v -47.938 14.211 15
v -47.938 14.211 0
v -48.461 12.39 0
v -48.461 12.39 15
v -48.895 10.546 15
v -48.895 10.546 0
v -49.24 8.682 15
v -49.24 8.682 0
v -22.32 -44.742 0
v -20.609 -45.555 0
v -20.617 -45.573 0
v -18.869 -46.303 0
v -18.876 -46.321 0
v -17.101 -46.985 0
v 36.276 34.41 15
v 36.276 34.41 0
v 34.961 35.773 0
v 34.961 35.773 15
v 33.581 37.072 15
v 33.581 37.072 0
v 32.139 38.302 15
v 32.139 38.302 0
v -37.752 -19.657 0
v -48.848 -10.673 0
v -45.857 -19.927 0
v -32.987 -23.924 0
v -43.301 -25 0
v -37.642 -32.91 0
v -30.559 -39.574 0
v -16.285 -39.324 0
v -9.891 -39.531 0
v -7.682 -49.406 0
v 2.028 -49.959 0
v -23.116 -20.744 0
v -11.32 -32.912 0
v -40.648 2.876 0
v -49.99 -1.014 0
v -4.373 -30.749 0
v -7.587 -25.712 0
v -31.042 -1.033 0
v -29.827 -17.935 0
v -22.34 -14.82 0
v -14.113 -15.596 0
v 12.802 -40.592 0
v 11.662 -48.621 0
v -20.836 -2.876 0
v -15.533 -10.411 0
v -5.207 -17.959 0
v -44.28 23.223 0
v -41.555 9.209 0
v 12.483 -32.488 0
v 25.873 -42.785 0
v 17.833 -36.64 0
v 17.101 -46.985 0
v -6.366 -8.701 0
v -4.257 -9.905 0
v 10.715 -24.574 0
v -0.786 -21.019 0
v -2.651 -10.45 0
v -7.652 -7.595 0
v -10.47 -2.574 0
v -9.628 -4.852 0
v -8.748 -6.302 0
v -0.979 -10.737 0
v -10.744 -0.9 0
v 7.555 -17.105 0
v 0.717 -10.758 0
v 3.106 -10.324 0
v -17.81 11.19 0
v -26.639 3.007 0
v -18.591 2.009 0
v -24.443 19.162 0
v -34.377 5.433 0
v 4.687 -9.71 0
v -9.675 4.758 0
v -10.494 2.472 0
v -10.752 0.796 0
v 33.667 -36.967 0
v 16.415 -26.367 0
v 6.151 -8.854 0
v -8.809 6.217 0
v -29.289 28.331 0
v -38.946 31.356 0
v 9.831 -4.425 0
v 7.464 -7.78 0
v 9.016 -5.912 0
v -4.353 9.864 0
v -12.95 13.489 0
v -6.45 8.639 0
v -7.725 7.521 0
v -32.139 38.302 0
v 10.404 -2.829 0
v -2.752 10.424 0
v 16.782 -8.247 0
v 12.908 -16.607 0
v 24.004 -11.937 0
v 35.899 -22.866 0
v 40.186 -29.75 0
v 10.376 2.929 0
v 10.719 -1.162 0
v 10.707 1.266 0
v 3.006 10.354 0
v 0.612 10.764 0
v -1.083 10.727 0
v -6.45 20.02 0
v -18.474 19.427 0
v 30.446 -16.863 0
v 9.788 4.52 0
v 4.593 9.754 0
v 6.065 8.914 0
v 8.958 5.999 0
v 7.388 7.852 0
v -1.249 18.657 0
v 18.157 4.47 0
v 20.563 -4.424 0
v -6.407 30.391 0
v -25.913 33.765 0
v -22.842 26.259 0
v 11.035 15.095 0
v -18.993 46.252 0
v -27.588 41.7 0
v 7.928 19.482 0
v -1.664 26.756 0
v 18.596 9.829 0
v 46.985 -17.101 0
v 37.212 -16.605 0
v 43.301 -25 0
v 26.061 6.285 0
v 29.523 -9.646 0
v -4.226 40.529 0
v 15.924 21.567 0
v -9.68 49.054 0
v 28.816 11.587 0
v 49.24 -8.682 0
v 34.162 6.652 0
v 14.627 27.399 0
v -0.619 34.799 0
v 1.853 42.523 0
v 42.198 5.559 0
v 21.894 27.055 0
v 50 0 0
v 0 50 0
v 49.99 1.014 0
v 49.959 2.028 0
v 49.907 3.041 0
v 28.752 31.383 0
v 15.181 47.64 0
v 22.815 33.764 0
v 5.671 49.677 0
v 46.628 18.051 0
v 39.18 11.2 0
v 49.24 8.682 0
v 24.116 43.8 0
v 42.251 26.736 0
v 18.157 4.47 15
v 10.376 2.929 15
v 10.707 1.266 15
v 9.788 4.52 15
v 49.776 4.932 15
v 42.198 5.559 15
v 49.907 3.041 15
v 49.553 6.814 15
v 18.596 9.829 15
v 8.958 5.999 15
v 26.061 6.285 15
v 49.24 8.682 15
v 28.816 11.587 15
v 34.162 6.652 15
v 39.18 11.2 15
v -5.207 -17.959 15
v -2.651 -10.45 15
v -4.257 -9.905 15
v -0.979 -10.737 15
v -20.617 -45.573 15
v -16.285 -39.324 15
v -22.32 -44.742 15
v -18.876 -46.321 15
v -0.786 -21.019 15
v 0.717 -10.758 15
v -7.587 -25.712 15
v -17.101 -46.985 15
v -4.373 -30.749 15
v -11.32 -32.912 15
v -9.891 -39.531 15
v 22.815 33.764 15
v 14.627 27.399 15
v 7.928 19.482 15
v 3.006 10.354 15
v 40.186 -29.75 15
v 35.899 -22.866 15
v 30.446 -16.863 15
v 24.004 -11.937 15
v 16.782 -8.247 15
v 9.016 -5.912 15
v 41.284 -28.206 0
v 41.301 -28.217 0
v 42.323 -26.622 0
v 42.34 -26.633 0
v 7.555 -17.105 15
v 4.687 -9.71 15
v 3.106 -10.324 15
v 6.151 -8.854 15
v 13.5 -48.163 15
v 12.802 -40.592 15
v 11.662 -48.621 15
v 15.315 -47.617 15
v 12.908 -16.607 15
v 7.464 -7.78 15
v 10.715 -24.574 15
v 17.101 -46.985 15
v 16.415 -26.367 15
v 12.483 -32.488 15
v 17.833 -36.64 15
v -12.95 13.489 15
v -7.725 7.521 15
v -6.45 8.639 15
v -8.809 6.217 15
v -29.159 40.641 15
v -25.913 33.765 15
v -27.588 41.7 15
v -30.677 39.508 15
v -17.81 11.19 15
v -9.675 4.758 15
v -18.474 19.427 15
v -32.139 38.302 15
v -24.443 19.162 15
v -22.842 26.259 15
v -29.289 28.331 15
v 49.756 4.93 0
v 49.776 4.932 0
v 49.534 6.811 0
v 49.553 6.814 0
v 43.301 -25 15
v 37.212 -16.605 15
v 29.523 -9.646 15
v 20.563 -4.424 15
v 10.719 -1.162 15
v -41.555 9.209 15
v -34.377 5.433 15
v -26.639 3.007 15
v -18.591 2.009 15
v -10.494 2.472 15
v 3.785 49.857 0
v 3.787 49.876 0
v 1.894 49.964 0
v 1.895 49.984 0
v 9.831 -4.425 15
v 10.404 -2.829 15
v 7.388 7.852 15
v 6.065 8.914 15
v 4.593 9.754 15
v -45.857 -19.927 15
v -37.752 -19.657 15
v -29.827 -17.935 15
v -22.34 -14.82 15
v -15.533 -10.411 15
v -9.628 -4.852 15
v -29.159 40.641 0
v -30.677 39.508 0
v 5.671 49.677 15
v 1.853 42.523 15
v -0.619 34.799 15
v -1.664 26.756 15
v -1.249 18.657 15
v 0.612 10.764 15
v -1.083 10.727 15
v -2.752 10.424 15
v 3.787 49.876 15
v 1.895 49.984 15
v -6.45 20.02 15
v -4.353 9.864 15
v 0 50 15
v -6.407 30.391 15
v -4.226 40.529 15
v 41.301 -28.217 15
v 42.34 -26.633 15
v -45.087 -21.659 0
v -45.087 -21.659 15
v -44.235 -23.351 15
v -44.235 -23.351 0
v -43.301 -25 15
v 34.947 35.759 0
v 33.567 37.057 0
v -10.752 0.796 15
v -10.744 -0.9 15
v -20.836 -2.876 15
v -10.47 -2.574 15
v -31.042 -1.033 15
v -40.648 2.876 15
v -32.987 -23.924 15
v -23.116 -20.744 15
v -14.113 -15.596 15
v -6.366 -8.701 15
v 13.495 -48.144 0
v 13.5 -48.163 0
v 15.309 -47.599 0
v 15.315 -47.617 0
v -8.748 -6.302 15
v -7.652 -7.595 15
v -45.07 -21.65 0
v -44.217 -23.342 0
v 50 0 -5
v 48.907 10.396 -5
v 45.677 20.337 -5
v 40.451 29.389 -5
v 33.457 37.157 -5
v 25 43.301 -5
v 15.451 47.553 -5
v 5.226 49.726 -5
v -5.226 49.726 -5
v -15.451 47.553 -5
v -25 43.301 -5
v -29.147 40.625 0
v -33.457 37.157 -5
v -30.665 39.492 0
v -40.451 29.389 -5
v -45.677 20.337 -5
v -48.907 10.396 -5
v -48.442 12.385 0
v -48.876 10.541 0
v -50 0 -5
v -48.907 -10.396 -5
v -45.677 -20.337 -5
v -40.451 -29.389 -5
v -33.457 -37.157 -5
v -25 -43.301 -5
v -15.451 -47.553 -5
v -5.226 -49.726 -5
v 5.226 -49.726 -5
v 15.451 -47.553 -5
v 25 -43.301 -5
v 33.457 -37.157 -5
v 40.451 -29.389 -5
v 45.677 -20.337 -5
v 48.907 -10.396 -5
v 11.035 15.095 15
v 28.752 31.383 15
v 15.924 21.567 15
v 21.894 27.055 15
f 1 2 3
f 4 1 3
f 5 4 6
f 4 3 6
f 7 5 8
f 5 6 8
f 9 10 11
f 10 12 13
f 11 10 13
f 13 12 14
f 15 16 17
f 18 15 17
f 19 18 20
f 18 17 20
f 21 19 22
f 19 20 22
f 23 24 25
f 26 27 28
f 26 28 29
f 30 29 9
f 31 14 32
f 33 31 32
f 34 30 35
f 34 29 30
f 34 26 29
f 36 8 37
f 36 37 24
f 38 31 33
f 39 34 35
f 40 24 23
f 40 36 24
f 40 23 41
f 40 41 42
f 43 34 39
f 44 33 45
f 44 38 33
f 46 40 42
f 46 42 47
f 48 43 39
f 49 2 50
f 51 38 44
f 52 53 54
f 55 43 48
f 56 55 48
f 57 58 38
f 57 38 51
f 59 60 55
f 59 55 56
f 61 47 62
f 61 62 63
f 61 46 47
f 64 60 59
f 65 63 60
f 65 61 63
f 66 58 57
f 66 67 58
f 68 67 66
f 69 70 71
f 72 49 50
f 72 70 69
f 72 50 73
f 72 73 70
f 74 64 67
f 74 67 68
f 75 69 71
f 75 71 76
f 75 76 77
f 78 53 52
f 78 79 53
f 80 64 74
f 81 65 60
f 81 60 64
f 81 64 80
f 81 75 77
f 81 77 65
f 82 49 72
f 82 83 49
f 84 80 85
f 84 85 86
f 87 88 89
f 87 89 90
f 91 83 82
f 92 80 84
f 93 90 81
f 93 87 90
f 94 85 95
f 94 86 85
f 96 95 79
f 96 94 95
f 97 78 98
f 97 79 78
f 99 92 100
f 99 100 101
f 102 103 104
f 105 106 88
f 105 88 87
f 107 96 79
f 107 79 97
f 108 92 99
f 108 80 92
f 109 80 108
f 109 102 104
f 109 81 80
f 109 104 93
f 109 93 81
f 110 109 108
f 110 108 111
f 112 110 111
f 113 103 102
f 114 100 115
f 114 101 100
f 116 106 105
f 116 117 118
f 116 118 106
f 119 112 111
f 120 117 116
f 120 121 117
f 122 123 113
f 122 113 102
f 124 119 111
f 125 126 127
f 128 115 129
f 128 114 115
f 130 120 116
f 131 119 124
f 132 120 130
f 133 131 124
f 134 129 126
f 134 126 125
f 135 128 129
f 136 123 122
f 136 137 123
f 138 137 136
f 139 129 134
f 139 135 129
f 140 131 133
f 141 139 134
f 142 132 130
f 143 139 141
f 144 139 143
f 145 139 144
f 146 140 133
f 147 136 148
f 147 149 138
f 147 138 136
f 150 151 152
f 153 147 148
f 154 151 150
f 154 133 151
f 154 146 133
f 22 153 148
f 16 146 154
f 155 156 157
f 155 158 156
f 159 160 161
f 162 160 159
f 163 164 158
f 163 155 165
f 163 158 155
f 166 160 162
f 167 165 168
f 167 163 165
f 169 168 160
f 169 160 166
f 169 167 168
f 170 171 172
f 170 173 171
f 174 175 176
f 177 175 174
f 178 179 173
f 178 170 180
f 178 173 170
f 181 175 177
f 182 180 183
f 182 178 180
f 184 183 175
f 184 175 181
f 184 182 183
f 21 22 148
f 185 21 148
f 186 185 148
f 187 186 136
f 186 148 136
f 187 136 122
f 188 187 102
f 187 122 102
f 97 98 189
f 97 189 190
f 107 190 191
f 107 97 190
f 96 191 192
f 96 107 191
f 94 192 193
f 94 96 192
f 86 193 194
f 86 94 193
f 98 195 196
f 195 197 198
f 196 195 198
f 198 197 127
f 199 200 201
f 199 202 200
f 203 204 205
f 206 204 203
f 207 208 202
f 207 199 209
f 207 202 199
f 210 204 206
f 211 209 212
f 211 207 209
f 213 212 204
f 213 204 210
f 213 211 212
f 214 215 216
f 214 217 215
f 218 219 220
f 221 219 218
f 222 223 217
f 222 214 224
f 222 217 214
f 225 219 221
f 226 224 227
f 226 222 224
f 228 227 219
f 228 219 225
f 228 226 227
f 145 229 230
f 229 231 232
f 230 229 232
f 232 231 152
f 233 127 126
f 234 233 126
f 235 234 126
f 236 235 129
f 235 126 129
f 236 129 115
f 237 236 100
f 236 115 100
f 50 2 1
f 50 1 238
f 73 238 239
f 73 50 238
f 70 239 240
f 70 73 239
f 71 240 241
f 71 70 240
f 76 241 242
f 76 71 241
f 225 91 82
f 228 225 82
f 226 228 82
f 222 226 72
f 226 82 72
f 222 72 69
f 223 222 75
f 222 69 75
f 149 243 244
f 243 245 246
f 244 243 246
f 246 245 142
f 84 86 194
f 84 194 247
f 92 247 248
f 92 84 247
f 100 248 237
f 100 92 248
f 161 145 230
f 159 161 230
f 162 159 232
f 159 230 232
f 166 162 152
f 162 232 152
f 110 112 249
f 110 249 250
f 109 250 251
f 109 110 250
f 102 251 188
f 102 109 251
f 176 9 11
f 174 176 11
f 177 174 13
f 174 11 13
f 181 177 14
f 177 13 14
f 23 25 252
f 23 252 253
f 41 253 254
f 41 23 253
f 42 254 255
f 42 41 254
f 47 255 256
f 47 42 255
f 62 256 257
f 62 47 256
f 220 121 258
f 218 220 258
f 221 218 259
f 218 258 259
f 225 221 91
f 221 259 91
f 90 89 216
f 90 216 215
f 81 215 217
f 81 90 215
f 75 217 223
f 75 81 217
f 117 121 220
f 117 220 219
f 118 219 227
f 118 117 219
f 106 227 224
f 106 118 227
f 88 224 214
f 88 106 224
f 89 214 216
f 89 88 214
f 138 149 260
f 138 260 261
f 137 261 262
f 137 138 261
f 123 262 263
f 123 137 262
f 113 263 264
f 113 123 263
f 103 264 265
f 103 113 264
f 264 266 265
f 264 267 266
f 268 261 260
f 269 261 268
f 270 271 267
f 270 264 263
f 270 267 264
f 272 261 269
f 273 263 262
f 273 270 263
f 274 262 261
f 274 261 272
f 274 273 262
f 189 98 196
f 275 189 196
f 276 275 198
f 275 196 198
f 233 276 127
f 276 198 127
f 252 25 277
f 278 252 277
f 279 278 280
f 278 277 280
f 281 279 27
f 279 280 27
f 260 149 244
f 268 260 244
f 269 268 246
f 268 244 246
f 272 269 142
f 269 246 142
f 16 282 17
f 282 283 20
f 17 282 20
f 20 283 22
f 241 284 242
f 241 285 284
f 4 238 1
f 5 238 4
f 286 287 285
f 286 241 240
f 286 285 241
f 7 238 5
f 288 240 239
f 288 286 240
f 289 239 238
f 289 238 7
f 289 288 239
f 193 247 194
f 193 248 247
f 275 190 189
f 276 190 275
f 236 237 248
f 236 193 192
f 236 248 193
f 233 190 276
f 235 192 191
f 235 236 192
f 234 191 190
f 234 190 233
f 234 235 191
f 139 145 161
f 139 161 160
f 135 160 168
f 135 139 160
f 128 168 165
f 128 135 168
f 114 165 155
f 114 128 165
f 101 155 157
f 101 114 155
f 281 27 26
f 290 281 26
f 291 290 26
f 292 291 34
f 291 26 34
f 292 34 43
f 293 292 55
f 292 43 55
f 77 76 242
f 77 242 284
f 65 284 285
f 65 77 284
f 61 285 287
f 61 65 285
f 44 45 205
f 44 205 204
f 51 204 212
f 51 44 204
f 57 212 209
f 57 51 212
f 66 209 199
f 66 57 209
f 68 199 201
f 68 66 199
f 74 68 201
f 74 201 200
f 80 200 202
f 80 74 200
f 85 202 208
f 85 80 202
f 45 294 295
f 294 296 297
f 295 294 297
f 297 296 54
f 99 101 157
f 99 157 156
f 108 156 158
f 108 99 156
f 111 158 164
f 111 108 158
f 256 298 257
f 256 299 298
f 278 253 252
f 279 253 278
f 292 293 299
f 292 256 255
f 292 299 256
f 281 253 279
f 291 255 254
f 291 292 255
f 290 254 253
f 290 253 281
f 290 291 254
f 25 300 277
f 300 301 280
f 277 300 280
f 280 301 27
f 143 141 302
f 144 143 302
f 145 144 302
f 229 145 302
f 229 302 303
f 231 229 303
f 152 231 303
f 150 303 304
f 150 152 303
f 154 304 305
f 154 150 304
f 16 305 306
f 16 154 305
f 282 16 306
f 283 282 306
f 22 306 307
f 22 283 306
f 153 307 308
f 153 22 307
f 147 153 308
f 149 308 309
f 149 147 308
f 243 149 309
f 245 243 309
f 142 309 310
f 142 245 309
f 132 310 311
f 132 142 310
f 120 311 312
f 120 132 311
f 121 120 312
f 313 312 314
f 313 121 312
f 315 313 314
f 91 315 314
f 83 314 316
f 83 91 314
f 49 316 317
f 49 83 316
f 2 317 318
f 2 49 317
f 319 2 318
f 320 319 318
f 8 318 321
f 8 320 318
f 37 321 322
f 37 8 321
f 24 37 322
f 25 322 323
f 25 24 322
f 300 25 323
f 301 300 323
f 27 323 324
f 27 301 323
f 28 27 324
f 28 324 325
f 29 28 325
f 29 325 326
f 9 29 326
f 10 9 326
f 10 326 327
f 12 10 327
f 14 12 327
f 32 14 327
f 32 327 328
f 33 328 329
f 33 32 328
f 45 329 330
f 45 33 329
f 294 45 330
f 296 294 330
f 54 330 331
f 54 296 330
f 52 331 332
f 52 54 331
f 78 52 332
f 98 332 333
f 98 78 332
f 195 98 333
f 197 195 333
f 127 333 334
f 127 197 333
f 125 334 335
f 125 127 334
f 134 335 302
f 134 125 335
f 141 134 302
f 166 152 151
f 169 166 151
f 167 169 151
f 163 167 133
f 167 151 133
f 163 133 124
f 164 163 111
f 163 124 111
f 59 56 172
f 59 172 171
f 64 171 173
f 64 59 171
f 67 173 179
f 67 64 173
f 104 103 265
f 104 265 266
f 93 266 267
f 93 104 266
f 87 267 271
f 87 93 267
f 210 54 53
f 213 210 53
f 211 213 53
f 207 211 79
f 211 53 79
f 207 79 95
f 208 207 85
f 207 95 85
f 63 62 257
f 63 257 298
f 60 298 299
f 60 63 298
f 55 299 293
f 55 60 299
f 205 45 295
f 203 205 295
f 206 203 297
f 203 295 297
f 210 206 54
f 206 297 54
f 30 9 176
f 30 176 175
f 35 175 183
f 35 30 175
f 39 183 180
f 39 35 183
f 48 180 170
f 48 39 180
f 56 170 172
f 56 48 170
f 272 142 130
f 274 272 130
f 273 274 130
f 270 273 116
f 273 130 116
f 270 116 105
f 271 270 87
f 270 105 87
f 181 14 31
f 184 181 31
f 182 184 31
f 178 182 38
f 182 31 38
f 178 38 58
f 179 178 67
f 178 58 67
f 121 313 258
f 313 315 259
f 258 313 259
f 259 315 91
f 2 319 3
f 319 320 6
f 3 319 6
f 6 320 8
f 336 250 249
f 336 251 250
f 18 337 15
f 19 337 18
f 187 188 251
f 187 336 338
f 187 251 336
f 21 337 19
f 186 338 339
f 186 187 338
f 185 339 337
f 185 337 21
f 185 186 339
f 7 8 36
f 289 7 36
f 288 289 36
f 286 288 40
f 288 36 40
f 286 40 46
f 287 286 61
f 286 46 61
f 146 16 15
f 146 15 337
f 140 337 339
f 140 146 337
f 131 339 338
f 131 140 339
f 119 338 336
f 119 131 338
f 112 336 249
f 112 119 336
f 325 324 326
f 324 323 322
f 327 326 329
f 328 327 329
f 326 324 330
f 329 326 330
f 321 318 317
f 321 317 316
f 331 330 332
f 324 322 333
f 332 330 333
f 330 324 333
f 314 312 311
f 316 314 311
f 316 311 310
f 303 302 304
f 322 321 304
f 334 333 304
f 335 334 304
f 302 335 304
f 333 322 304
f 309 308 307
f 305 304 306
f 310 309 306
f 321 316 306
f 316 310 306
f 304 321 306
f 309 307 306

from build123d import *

# Parameters (mm, degrees)
SKETCH_R           = 50
PAD_DEPTH          = 5
PAD001_DEPTH       = 15
POLARPATTERN_COUNT = 9


with BuildPart() as part:
    # Sketch → Pad (new body)
    with BuildSketch(Plane.XY):
        Circle(SKETCH_R)
    extrude(amount=-PAD_DEPTH)

    # Sketch001 → Pad001 (join)
    with BuildSketch(Plane.XY):
        with BuildLine():
            ThreePointArc((43.30127, -25), (29.522789, -9.6465), (10.718625, -1.162401))
            ThreePointArc((9.015743, -5.912401), (10.148987, -3.638428), (10.718625, -1.162401))
            ThreePointArc((40.186285, -29.75), (27.336197, -14.254618), (9.015743, -5.912401))
            ThreePointArc((40.186285, -29.75), (41.829839, -27.431438), (43.30127, -25))
        make_face()
    pad001 = extrude(amount=PAD001_DEPTH)

    # PolarPattern: Pad001 ×9 about axis
    polarpattern_axis = Axis((0, 0, 0), (0, 0, 1))
    for i in range(1, POLARPATTERN_COUNT):
        add(pad001.rotate(polarpattern_axis, i * 360 / POLARPATTERN_COUNT))


solid = part.part
